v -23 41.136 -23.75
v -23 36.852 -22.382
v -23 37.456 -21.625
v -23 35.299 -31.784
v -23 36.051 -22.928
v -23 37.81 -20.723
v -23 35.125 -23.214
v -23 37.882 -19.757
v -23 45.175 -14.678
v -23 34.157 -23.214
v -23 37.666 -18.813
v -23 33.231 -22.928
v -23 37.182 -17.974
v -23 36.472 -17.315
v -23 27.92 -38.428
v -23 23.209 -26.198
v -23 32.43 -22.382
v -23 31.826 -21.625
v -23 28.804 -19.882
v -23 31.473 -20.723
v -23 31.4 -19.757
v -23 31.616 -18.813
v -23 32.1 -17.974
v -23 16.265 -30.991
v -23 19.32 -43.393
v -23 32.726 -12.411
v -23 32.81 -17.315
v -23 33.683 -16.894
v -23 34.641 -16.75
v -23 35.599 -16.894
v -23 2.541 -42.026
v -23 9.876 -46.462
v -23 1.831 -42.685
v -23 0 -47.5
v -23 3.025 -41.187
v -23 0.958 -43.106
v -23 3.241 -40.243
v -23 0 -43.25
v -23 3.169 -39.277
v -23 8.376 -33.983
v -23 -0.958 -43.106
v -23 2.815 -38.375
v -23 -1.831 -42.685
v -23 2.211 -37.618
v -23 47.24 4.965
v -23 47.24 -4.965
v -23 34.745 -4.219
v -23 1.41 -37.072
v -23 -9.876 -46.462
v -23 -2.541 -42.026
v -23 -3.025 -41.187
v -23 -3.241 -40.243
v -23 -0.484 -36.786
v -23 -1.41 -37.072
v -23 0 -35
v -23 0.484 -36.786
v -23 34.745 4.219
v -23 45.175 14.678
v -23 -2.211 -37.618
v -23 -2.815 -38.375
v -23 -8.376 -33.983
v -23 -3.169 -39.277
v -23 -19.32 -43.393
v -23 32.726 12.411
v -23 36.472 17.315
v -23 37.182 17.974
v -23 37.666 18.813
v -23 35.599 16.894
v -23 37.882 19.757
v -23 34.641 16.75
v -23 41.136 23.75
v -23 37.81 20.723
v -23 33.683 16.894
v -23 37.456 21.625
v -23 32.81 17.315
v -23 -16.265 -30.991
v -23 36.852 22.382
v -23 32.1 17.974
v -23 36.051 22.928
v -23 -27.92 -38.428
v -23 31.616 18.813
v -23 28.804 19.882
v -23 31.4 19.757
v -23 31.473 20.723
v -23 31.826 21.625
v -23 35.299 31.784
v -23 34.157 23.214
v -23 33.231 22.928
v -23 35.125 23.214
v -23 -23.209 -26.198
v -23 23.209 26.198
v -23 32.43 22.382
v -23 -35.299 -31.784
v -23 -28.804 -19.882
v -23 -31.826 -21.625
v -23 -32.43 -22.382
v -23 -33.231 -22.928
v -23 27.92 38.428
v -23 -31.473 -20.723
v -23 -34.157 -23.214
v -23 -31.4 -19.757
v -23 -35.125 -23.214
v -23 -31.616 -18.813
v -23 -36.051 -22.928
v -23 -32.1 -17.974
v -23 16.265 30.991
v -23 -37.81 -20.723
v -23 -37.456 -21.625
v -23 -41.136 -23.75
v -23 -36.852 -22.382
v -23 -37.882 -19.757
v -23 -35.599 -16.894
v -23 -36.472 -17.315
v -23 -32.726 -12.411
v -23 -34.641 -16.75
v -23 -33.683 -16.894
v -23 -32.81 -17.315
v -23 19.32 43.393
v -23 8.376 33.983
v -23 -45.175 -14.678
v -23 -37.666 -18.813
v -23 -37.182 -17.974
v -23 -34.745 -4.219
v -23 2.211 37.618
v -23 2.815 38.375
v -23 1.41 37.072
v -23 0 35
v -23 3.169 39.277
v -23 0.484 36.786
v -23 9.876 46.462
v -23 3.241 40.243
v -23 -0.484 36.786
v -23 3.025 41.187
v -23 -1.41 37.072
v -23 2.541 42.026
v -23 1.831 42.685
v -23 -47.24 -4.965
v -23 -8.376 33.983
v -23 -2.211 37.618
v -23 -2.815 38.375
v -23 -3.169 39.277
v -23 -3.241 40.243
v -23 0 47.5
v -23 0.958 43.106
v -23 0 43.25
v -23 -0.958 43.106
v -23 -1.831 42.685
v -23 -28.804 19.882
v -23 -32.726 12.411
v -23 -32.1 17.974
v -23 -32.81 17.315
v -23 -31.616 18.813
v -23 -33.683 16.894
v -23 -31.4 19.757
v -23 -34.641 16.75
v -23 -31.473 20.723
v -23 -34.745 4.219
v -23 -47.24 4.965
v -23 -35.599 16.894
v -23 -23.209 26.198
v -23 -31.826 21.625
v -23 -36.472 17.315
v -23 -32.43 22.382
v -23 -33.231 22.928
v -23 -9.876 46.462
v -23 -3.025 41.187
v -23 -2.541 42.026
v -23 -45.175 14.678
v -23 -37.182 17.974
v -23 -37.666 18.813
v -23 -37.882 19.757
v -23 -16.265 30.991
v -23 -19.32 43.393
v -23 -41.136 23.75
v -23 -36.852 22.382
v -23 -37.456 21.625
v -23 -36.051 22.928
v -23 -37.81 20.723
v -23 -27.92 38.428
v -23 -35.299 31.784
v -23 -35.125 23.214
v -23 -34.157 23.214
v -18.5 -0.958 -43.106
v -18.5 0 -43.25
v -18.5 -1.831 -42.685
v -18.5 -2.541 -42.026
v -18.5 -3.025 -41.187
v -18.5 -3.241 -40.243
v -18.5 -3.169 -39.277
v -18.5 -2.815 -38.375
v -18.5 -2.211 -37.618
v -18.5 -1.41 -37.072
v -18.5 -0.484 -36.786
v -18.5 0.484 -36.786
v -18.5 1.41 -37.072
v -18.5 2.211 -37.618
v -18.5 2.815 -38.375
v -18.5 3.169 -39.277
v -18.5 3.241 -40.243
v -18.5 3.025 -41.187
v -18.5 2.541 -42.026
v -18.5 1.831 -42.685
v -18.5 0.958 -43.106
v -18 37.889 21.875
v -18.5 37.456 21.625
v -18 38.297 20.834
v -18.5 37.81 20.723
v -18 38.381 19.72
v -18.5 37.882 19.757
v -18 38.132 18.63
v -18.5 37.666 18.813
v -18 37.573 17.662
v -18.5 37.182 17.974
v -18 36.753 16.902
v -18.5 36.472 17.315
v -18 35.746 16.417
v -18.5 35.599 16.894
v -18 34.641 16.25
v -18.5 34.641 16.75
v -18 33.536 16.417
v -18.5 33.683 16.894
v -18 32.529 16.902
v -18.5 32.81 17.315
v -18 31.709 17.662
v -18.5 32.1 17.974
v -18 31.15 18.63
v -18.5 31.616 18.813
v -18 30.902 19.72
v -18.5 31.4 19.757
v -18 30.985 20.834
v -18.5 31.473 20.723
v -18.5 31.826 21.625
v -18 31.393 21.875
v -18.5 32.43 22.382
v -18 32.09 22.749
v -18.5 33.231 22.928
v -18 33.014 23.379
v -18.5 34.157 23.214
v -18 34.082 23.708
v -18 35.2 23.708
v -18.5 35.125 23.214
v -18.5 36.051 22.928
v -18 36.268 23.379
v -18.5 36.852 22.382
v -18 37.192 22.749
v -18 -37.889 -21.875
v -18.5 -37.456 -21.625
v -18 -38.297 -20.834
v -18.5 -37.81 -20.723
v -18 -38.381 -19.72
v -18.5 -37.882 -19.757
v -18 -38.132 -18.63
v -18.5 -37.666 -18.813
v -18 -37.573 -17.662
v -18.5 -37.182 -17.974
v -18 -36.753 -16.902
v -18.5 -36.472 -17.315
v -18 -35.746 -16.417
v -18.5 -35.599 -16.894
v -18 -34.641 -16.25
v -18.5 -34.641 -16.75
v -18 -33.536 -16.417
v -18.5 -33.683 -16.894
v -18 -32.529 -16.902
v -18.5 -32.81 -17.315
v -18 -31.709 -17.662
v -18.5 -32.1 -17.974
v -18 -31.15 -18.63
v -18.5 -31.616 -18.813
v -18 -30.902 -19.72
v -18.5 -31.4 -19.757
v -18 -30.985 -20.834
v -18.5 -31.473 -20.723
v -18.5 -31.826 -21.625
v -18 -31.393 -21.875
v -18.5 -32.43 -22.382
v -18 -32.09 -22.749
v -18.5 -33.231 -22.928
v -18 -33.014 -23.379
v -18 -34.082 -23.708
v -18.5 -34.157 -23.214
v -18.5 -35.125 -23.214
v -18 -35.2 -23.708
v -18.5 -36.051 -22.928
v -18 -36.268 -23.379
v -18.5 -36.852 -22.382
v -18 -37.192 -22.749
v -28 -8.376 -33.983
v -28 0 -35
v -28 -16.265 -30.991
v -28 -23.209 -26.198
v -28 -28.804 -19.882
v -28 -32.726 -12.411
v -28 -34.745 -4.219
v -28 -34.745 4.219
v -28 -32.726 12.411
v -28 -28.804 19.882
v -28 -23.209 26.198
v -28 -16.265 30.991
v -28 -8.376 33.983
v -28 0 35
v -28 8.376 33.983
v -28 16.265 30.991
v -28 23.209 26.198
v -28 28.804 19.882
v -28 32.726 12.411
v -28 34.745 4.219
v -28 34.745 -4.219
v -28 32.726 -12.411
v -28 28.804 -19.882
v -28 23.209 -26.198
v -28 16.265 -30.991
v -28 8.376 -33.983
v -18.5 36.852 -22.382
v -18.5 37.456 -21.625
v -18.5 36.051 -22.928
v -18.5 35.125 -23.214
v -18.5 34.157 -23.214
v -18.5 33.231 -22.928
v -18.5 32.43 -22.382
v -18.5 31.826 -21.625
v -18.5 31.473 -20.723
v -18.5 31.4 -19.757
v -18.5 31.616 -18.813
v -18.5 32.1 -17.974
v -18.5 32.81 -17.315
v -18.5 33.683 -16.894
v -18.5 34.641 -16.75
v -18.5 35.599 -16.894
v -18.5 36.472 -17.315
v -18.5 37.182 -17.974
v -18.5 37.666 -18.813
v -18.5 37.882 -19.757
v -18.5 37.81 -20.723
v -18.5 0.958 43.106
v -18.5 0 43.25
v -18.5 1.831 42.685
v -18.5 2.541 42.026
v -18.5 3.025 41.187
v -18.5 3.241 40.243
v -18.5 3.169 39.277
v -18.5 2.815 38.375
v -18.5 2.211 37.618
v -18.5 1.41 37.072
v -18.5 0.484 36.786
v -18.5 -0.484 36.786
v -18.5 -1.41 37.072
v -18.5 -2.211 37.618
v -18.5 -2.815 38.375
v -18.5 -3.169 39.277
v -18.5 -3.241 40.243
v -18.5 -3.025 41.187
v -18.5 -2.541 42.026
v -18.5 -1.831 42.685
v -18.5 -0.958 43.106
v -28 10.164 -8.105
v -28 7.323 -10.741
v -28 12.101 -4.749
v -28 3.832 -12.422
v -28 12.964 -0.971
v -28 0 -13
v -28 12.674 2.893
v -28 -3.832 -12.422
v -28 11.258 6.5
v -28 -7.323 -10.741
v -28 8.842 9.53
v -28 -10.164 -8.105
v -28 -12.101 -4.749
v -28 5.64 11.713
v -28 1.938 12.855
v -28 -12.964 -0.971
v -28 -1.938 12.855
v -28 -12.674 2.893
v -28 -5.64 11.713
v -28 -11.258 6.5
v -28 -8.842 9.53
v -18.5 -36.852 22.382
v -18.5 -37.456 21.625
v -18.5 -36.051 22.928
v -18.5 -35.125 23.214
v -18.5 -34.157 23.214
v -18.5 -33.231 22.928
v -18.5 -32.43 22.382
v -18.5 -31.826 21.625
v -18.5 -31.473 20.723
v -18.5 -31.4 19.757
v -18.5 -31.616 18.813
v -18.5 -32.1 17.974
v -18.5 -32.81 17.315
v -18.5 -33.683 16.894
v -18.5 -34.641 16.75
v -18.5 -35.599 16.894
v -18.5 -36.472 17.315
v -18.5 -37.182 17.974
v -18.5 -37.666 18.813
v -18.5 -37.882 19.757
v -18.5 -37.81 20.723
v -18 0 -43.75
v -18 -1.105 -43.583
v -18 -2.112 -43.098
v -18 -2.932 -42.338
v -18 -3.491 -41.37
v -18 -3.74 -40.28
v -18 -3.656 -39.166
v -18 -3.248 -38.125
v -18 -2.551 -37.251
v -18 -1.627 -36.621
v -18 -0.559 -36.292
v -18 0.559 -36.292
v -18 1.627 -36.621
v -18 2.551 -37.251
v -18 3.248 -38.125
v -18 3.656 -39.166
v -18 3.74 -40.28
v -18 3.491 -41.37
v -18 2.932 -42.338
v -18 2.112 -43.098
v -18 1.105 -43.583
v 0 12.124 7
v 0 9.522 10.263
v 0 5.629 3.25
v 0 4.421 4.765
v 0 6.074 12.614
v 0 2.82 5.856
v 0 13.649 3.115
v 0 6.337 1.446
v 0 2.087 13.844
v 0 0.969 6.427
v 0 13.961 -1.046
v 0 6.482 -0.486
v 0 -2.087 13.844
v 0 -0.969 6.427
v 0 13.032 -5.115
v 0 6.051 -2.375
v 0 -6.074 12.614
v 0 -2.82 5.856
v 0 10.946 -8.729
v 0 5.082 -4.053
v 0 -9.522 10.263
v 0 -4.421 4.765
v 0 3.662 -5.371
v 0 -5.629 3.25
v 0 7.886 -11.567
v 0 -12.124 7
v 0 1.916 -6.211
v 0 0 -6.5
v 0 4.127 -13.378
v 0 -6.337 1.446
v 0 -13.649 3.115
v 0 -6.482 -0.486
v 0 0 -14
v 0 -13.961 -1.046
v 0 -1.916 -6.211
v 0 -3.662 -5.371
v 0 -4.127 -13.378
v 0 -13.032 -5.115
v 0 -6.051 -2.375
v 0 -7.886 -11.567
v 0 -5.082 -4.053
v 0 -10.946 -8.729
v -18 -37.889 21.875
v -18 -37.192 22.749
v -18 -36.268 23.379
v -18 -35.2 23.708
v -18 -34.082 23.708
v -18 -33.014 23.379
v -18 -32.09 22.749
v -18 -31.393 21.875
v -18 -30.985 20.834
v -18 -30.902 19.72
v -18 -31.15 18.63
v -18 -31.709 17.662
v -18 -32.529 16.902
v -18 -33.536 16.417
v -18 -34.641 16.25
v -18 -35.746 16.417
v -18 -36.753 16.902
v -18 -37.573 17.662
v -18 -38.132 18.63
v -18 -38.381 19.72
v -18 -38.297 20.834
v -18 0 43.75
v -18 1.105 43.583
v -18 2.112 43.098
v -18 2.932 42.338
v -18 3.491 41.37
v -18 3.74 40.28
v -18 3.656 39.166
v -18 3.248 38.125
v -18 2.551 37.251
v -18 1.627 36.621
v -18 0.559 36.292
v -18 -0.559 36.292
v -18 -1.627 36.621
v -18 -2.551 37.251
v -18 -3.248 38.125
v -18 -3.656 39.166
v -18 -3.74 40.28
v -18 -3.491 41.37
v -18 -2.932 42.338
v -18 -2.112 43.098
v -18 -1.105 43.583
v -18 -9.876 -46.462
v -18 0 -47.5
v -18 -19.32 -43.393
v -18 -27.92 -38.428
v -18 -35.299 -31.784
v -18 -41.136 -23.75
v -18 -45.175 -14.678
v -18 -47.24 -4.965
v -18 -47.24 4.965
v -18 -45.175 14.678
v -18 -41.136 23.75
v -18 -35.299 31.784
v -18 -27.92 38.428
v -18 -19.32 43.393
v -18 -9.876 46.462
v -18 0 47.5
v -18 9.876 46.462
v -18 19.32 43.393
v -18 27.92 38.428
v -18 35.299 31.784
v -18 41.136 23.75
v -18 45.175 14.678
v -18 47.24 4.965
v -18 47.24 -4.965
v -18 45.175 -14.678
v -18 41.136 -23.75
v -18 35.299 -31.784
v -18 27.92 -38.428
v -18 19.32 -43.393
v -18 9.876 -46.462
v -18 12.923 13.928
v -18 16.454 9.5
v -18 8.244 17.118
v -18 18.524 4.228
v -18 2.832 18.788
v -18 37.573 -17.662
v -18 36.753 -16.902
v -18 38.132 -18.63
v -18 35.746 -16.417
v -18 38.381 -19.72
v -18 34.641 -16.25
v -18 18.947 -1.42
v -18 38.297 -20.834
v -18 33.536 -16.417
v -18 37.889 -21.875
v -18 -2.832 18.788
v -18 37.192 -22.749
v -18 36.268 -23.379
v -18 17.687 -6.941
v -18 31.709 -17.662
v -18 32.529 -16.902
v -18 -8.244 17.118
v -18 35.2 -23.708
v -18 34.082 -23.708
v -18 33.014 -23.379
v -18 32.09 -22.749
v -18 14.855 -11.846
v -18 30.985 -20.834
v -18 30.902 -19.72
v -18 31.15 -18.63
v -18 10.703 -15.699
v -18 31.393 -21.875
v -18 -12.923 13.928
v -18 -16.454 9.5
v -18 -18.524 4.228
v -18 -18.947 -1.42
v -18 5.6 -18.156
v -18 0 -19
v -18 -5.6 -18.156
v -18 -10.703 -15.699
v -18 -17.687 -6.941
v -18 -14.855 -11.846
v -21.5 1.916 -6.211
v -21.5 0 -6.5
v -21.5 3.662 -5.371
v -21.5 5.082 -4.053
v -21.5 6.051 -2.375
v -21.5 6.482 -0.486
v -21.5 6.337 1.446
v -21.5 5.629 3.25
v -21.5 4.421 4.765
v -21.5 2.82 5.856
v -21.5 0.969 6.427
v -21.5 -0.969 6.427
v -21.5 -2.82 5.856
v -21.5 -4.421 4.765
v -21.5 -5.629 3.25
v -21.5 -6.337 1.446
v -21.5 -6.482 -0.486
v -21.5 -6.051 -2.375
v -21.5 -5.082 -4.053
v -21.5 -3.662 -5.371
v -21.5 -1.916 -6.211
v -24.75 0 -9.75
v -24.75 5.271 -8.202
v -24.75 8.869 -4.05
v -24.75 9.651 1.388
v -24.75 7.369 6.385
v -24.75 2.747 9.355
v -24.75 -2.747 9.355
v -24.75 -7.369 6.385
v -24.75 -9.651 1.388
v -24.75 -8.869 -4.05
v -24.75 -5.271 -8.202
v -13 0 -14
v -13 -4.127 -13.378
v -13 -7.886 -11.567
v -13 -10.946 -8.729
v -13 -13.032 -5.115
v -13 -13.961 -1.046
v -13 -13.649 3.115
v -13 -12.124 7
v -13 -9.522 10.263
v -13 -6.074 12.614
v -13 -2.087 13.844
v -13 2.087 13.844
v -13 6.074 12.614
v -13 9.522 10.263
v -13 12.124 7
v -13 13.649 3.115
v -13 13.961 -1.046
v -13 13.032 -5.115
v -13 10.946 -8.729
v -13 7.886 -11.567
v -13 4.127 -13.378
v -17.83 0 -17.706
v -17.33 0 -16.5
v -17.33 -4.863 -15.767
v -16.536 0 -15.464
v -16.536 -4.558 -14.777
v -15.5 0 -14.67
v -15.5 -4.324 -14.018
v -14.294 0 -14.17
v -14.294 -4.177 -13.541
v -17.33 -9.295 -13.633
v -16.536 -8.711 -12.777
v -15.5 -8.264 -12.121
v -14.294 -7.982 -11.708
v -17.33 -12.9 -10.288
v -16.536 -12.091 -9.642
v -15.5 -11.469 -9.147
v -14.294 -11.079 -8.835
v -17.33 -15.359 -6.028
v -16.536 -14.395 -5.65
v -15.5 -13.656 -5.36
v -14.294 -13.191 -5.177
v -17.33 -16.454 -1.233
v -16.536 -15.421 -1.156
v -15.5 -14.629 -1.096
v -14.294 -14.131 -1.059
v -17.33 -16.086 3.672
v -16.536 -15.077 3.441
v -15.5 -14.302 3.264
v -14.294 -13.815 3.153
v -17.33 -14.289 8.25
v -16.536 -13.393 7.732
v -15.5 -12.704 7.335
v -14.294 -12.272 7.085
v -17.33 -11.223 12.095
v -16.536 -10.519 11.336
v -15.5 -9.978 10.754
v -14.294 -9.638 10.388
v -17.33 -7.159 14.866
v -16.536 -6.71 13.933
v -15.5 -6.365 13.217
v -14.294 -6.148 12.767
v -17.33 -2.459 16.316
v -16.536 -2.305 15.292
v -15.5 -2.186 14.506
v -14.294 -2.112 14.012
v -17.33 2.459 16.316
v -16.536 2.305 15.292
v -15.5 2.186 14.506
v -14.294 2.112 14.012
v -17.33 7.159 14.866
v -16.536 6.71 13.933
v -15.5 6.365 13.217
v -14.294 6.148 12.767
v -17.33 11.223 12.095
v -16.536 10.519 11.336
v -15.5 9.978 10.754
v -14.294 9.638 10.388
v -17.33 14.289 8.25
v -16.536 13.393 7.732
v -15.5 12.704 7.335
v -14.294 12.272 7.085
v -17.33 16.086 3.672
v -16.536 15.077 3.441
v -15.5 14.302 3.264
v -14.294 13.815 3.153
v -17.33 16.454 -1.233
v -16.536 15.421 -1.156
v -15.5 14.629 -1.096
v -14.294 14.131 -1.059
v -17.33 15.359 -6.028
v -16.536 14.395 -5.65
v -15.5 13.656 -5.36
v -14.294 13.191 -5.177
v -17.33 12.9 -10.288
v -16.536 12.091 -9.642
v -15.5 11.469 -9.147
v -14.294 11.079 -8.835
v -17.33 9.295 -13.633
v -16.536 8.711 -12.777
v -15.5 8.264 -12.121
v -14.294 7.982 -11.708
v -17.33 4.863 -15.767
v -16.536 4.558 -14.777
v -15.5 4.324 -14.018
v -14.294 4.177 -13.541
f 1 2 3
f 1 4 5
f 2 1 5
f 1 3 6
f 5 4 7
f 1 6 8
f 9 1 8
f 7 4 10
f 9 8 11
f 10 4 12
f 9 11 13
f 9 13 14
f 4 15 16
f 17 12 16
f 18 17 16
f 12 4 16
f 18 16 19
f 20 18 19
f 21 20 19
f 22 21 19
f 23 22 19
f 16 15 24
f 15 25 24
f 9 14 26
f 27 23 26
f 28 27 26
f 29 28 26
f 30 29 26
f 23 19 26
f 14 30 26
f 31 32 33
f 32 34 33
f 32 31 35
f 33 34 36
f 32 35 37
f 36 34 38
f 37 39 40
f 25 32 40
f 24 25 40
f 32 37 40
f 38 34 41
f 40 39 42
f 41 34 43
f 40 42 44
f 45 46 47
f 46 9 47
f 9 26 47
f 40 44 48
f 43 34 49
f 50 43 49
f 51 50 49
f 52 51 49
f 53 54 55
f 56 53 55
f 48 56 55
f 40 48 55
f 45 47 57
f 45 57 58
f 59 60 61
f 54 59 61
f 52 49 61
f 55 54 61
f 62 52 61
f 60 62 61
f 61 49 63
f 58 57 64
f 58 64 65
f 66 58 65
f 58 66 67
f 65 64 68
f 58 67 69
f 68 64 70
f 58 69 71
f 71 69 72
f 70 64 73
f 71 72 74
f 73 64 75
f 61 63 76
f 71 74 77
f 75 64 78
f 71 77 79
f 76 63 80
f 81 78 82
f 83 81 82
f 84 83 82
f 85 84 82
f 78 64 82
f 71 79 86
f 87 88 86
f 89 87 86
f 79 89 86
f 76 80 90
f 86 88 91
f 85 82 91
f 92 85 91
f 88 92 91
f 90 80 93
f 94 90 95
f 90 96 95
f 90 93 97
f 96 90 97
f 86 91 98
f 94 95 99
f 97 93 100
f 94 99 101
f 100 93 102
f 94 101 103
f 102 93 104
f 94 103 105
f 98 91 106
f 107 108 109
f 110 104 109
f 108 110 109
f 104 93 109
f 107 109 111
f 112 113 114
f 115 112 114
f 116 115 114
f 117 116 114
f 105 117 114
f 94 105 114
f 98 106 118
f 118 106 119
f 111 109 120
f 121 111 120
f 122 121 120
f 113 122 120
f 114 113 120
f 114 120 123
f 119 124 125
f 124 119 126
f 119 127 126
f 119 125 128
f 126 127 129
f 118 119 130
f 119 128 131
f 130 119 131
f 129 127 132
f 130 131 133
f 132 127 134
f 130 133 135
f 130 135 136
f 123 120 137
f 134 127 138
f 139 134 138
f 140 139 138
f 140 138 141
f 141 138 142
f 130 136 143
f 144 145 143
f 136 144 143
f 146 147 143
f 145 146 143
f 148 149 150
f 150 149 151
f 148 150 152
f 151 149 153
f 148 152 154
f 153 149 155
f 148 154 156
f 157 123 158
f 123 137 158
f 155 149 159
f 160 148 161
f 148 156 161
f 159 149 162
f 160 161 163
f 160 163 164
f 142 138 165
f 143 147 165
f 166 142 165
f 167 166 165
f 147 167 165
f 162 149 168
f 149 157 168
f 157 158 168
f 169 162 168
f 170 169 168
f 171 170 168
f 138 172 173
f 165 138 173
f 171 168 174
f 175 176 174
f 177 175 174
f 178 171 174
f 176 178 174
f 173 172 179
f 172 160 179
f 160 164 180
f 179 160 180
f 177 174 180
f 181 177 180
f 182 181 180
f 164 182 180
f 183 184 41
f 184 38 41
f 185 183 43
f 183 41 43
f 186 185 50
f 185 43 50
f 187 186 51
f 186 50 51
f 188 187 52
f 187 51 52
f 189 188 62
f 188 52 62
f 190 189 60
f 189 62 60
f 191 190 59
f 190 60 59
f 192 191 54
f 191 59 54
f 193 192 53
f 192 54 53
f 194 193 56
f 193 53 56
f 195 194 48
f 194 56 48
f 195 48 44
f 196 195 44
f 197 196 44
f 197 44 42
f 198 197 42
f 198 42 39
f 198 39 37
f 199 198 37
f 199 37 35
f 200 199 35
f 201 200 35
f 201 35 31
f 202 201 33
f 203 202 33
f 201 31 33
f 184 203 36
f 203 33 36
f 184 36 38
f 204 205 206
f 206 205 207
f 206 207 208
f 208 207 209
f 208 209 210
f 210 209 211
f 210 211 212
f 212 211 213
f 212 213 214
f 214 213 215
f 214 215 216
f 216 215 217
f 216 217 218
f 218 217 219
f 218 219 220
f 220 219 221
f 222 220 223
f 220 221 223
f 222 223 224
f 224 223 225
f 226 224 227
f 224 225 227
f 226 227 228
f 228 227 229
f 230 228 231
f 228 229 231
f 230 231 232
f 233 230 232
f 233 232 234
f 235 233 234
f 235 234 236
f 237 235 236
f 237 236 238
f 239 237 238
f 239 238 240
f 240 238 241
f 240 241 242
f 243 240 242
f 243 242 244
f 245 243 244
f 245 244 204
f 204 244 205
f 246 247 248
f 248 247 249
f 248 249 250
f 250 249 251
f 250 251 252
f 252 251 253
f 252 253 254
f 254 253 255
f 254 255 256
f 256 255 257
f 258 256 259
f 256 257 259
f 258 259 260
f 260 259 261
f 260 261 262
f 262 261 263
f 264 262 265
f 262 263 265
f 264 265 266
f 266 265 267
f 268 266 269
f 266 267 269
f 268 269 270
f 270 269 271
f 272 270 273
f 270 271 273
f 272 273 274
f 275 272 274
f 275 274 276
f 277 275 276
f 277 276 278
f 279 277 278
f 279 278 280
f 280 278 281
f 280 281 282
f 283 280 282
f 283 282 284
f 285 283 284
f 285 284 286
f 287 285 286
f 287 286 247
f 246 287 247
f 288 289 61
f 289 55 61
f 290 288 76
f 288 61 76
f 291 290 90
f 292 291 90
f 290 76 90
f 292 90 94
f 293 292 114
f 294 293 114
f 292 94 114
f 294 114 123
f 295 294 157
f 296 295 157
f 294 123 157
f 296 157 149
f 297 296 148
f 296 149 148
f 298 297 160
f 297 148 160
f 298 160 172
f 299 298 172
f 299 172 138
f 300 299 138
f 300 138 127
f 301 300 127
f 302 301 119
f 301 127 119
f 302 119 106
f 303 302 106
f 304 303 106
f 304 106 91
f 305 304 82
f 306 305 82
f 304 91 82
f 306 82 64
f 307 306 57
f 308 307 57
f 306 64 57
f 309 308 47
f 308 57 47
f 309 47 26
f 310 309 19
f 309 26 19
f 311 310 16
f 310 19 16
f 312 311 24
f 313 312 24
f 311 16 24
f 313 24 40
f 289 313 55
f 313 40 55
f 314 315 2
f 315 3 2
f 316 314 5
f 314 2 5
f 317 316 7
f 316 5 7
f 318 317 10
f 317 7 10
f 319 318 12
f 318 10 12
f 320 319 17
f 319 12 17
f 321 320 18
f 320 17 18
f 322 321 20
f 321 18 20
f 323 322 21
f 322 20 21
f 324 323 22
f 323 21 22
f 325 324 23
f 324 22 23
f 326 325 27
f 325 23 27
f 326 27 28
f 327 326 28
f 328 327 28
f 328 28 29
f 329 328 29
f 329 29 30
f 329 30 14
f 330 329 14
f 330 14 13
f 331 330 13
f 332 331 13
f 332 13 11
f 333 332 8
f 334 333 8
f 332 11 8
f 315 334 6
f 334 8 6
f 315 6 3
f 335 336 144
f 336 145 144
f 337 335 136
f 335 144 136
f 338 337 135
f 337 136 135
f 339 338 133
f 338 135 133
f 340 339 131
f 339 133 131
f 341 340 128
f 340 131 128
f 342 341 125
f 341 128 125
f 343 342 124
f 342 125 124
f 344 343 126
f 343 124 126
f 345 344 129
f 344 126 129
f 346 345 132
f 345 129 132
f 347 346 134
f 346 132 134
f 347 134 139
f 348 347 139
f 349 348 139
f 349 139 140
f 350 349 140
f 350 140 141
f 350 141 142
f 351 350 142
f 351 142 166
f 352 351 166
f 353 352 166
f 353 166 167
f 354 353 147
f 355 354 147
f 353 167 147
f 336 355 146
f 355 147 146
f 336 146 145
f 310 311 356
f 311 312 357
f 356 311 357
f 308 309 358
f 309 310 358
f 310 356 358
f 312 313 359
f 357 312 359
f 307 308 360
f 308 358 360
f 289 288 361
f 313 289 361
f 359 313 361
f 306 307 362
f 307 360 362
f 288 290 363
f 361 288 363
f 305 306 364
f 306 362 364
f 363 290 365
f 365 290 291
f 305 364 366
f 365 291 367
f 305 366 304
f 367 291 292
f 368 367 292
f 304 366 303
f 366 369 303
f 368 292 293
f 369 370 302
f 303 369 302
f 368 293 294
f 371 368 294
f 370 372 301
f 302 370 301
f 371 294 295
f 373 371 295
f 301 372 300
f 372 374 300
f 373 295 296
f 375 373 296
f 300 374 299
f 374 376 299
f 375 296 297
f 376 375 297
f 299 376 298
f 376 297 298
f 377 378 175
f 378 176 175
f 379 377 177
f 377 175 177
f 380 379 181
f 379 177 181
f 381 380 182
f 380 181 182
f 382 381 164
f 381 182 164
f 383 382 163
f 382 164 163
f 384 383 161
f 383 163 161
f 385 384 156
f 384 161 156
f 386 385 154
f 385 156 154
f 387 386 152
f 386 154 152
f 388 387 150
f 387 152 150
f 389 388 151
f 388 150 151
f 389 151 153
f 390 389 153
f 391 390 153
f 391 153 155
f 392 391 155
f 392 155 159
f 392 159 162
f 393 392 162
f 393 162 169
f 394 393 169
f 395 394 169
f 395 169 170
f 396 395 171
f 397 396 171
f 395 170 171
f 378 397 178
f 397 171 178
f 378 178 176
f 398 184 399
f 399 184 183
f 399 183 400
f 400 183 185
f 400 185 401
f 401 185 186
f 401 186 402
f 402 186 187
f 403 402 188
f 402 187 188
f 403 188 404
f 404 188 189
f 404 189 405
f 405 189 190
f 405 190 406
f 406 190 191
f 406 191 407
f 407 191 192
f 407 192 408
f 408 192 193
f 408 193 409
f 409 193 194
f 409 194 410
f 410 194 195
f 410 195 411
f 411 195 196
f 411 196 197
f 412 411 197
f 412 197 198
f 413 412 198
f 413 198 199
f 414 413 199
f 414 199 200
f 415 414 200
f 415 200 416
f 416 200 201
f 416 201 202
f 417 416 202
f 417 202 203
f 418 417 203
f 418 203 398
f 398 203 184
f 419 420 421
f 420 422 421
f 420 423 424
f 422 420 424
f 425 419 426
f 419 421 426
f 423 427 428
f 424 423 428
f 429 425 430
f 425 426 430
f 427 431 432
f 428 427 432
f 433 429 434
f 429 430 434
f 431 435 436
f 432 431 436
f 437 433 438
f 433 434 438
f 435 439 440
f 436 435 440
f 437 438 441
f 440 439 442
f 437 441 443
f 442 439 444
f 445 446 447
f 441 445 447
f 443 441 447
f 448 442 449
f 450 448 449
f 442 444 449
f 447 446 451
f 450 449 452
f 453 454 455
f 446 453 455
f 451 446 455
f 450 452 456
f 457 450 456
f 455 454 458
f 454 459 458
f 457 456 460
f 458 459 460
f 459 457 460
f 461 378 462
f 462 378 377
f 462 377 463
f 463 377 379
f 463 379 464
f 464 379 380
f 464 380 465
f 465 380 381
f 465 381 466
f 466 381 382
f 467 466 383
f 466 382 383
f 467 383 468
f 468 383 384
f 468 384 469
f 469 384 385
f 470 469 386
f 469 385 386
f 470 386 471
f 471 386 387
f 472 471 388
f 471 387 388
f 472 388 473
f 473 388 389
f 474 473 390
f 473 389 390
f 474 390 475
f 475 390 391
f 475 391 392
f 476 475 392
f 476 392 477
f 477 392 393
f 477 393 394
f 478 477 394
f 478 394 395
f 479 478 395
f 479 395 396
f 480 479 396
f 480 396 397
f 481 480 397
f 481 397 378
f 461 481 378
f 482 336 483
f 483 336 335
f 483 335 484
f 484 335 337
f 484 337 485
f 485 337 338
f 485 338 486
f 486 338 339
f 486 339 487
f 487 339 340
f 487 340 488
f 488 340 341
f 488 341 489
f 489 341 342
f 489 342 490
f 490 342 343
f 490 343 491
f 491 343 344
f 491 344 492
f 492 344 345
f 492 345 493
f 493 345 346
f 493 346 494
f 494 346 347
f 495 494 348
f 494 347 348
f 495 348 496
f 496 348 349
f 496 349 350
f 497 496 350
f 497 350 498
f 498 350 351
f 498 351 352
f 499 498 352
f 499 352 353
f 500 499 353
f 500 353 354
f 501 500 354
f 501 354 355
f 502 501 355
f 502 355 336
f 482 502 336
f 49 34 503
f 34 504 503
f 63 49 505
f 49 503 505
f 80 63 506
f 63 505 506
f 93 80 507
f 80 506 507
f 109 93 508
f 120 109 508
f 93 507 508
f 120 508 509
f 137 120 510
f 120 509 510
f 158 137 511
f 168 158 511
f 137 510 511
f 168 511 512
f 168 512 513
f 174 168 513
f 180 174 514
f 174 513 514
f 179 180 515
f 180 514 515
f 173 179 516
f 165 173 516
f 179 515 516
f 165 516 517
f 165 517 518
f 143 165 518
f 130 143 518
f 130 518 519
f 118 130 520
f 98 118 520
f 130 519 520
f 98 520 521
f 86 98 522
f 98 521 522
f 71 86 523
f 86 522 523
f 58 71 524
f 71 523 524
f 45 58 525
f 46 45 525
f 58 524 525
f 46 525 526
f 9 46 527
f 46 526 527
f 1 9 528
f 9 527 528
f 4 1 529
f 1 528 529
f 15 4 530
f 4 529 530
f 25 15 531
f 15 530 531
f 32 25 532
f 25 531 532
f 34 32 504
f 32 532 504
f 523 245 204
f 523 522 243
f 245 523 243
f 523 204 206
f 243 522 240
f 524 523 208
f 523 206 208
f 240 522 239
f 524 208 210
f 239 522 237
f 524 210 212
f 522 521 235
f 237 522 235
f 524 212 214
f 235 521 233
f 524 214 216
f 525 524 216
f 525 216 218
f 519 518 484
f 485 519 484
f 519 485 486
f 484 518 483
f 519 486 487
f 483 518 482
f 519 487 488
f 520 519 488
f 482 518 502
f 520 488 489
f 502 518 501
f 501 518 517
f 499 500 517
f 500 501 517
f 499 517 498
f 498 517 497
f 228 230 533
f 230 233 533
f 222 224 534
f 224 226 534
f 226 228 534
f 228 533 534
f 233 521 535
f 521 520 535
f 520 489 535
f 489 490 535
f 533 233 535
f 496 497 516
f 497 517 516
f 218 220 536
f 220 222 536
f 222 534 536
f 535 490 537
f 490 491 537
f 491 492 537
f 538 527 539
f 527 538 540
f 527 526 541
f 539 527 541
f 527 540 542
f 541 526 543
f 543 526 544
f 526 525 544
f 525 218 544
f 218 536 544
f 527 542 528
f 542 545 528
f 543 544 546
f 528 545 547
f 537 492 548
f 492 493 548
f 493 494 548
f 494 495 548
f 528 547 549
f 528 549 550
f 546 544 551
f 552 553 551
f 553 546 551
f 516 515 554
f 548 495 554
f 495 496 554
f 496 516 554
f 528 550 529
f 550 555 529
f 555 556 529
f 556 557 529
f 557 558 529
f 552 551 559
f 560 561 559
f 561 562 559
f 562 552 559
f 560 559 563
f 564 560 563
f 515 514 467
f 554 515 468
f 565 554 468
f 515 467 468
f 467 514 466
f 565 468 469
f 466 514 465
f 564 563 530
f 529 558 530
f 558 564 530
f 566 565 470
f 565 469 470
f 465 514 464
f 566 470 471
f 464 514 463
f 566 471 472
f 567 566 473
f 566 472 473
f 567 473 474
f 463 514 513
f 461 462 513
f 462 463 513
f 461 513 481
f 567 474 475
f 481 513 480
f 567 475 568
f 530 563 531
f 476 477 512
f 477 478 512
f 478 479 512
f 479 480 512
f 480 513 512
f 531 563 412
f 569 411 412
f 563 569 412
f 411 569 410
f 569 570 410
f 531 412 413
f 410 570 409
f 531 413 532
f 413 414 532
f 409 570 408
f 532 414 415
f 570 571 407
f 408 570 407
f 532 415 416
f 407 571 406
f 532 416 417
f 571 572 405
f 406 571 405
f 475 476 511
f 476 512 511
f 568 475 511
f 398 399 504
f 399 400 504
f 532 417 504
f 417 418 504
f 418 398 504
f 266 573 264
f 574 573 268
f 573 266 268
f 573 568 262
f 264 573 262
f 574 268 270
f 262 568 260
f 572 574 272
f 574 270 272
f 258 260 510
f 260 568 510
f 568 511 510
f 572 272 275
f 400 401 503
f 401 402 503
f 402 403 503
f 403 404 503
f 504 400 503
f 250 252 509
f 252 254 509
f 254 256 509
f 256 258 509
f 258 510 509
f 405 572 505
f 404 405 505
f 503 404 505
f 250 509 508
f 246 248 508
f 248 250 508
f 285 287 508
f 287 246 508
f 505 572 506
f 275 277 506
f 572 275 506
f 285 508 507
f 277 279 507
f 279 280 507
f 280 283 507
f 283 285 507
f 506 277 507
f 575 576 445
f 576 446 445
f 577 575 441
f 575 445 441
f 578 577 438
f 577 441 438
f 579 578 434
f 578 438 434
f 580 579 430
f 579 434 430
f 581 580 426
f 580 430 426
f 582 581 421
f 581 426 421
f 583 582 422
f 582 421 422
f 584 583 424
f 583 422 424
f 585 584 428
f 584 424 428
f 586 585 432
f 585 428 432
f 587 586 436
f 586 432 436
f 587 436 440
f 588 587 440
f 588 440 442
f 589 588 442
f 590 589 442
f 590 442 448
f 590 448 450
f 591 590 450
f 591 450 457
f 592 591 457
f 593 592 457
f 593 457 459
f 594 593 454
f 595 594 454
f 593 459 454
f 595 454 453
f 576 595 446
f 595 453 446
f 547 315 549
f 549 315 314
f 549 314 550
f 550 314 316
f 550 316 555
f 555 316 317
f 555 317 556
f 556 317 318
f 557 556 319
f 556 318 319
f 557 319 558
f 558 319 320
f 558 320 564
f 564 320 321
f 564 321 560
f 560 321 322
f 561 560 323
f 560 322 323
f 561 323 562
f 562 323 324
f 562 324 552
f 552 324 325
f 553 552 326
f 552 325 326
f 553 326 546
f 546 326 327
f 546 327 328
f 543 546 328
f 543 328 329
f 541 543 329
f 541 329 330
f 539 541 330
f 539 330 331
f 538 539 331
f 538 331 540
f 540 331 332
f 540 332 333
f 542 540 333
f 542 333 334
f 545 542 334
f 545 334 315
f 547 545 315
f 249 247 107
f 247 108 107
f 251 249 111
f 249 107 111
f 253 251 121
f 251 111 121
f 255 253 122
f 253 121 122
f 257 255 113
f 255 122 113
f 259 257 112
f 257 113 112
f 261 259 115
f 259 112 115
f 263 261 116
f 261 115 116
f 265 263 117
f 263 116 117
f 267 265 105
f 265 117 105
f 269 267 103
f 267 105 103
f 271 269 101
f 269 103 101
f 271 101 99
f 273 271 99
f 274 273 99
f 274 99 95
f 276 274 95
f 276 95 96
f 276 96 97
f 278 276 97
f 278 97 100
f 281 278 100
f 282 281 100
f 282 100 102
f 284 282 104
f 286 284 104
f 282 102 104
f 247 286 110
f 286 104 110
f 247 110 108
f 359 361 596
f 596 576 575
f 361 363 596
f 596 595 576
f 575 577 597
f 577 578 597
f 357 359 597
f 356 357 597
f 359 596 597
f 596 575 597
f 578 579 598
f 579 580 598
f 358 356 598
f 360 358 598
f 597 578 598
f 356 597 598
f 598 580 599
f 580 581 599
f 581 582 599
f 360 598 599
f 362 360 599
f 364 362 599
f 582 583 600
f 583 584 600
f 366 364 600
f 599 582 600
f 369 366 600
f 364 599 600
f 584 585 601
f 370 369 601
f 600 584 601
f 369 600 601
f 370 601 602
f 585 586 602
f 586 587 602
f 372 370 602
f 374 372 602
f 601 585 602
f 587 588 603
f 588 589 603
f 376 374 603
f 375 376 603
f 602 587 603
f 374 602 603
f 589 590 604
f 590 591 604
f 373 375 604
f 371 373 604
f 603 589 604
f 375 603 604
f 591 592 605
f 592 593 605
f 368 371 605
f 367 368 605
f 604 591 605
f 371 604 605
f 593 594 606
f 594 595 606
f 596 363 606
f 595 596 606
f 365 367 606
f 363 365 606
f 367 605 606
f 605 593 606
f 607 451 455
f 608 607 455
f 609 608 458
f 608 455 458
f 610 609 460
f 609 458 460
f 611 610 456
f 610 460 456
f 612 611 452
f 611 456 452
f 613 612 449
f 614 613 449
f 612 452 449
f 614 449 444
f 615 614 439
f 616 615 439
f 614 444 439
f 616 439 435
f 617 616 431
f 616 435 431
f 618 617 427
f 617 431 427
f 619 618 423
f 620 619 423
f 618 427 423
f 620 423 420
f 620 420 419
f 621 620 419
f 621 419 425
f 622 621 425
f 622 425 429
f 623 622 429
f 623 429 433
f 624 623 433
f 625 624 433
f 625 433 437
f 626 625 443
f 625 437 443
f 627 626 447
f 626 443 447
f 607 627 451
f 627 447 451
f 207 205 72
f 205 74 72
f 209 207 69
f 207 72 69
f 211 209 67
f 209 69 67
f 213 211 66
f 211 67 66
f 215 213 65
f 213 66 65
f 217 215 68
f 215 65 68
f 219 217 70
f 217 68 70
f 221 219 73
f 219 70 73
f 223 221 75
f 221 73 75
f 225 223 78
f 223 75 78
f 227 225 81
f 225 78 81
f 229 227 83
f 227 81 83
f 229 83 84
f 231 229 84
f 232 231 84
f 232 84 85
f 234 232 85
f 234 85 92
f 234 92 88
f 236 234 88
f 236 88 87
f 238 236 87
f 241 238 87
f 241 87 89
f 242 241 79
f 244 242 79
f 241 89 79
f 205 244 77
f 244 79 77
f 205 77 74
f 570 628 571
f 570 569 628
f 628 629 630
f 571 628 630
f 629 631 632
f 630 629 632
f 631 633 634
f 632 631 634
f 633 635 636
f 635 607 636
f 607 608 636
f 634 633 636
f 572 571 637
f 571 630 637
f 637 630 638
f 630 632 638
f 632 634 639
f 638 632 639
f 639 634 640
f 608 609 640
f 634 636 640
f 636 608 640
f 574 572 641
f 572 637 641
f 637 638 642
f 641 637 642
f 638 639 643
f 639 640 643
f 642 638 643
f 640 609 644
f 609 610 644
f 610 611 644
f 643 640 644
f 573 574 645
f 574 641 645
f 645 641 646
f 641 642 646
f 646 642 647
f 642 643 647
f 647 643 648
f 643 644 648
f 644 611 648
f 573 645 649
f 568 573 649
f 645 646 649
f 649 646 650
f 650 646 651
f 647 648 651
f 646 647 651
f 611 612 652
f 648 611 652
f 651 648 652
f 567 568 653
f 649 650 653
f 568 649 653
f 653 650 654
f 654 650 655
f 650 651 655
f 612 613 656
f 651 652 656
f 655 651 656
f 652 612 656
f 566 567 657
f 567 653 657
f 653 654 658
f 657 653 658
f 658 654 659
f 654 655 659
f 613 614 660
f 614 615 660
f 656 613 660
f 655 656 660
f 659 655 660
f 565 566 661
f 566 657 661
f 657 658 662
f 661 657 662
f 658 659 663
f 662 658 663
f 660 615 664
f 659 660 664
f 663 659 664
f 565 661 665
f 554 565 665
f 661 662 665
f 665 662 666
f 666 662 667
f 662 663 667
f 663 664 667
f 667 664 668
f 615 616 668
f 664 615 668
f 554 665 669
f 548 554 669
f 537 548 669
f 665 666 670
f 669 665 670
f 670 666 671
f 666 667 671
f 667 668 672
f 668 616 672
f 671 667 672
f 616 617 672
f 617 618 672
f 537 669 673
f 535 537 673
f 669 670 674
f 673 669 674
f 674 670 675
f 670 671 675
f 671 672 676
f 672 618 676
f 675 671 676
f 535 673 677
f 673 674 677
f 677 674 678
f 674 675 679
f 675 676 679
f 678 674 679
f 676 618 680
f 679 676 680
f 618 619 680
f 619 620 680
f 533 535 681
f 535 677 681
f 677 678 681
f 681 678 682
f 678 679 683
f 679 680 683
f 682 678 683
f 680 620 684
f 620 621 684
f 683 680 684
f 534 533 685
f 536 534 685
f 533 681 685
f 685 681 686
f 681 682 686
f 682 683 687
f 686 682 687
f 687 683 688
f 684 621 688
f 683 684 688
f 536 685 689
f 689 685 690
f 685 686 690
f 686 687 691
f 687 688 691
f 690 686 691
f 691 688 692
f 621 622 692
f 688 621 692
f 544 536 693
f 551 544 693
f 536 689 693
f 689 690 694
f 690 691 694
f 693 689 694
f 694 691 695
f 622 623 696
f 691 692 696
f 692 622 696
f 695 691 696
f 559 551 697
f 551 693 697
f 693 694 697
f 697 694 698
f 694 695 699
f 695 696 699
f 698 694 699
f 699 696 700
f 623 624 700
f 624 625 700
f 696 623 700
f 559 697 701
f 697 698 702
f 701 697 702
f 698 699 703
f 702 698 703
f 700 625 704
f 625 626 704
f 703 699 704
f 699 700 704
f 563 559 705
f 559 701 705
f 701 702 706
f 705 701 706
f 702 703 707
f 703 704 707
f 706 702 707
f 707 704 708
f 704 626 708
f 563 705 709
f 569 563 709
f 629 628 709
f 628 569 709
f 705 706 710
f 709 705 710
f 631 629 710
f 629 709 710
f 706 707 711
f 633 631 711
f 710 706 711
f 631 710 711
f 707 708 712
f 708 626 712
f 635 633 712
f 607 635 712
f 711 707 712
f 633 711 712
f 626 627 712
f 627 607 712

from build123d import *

# Parameters (mm, degrees)
FILLET1_R                                            = 5
CSK_FOR_M12_HEX_SOCKET_COUNTERSUNK_CAP_S_D           = 13
CSK_FOR_M12_HEX_SOCKET_COUNTERSUNK_CAP_S_CSINK_D     = 26
CSK_FOR_M12_HEX_SOCKET_COUNTERSUNK_CAP_S_CSINK_ANGLE = 90
CSK_FOR_M6_HEX_SOCKET_COUNTERSUNK_CAP_SC_D           = 6.5
CSK_FOR_M6_HEX_SOCKET_COUNTERSUNK_CAP_SC_CSINK_D     = 7.5
CSK_FOR_M6_HEX_SOCKET_COUNTERSUNK_CAP_SC_CSINK_ANGLE = 90
CIRPATTERN1_COUNT                                    = 6


with BuildPart() as part:
    # Sketch1 → Revolve1 (revolve)
    with BuildSketch(Plane.XY, mode=Mode.PRIVATE) as revolve1_sk:
        Polygon((0, 0), (-28, 0), (-28, 35), (-23, 35), (-23, 47.5), (-18, 47.5), (-18, 14), (0, 14), align=None)
    revolve(revolve1_sk.sketch.rotate(Axis((0, 0, 0), (-1, 0, 0)), 90), axis=Axis((0, 0, 0), (-1, 0, 0)))

    # Fillet1
    fillet1_edges = [part.edges().sort_by_distance(p)[0] for p in [
        (-18, 0, 14),
    ]]
    fillet(fillet1_edges, radius=FILLET1_R)

    # CSK for M12 Hex Socket Countersunk Cap Screw1 (through all)
    with Locations(Plane.ZY.offset(28)):
        with Locations((0, 0)):
            CounterSinkHole(CSK_FOR_M12_HEX_SOCKET_COUNTERSUNK_CAP_S_D / 2, CSK_FOR_M12_HEX_SOCKET_COUNTERSUNK_CAP_S_CSINK_D / 2, counter_sink_angle=CSK_FOR_M12_HEX_SOCKET_COUNTERSUNK_CAP_S_CSINK_ANGLE)

    # CSK for M6 Hex Socket Countersunk Cap Screw1 (through all)
    with Locations(Plane(origin=(-18, 0, 0), x_dir=(0, 0, -1), z_dir=(1, 0, 0))):
        with Locations((-40, 0)):
            csk_for_m6_hex_socket_countersunk_cap_sc = CounterSinkHole(CSK_FOR_M6_HEX_SOCKET_COUNTERSUNK_CAP_SC_D / 2, CSK_FOR_M6_HEX_SOCKET_COUNTERSUNK_CAP_SC_CSINK_D / 2, counter_sink_angle=CSK_FOR_M6_HEX_SOCKET_COUNTERSUNK_CAP_SC_CSINK_ANGLE)

    # CirPattern1: CSK for M6 Hex Socket Countersunk Cap Screw1 ×6 about axis
    cirpattern1_axis = Axis((0, 0, 0), (1, 0, 0))
    for i in range(1, CIRPATTERN1_COUNT):
        add(csk_for_m6_hex_socket_countersunk_cap_sc.rotate(cirpattern1_axis, i * 360 / CIRPATTERN1_COUNT), mode=Mode.SUBTRACT)


solid = part.part
